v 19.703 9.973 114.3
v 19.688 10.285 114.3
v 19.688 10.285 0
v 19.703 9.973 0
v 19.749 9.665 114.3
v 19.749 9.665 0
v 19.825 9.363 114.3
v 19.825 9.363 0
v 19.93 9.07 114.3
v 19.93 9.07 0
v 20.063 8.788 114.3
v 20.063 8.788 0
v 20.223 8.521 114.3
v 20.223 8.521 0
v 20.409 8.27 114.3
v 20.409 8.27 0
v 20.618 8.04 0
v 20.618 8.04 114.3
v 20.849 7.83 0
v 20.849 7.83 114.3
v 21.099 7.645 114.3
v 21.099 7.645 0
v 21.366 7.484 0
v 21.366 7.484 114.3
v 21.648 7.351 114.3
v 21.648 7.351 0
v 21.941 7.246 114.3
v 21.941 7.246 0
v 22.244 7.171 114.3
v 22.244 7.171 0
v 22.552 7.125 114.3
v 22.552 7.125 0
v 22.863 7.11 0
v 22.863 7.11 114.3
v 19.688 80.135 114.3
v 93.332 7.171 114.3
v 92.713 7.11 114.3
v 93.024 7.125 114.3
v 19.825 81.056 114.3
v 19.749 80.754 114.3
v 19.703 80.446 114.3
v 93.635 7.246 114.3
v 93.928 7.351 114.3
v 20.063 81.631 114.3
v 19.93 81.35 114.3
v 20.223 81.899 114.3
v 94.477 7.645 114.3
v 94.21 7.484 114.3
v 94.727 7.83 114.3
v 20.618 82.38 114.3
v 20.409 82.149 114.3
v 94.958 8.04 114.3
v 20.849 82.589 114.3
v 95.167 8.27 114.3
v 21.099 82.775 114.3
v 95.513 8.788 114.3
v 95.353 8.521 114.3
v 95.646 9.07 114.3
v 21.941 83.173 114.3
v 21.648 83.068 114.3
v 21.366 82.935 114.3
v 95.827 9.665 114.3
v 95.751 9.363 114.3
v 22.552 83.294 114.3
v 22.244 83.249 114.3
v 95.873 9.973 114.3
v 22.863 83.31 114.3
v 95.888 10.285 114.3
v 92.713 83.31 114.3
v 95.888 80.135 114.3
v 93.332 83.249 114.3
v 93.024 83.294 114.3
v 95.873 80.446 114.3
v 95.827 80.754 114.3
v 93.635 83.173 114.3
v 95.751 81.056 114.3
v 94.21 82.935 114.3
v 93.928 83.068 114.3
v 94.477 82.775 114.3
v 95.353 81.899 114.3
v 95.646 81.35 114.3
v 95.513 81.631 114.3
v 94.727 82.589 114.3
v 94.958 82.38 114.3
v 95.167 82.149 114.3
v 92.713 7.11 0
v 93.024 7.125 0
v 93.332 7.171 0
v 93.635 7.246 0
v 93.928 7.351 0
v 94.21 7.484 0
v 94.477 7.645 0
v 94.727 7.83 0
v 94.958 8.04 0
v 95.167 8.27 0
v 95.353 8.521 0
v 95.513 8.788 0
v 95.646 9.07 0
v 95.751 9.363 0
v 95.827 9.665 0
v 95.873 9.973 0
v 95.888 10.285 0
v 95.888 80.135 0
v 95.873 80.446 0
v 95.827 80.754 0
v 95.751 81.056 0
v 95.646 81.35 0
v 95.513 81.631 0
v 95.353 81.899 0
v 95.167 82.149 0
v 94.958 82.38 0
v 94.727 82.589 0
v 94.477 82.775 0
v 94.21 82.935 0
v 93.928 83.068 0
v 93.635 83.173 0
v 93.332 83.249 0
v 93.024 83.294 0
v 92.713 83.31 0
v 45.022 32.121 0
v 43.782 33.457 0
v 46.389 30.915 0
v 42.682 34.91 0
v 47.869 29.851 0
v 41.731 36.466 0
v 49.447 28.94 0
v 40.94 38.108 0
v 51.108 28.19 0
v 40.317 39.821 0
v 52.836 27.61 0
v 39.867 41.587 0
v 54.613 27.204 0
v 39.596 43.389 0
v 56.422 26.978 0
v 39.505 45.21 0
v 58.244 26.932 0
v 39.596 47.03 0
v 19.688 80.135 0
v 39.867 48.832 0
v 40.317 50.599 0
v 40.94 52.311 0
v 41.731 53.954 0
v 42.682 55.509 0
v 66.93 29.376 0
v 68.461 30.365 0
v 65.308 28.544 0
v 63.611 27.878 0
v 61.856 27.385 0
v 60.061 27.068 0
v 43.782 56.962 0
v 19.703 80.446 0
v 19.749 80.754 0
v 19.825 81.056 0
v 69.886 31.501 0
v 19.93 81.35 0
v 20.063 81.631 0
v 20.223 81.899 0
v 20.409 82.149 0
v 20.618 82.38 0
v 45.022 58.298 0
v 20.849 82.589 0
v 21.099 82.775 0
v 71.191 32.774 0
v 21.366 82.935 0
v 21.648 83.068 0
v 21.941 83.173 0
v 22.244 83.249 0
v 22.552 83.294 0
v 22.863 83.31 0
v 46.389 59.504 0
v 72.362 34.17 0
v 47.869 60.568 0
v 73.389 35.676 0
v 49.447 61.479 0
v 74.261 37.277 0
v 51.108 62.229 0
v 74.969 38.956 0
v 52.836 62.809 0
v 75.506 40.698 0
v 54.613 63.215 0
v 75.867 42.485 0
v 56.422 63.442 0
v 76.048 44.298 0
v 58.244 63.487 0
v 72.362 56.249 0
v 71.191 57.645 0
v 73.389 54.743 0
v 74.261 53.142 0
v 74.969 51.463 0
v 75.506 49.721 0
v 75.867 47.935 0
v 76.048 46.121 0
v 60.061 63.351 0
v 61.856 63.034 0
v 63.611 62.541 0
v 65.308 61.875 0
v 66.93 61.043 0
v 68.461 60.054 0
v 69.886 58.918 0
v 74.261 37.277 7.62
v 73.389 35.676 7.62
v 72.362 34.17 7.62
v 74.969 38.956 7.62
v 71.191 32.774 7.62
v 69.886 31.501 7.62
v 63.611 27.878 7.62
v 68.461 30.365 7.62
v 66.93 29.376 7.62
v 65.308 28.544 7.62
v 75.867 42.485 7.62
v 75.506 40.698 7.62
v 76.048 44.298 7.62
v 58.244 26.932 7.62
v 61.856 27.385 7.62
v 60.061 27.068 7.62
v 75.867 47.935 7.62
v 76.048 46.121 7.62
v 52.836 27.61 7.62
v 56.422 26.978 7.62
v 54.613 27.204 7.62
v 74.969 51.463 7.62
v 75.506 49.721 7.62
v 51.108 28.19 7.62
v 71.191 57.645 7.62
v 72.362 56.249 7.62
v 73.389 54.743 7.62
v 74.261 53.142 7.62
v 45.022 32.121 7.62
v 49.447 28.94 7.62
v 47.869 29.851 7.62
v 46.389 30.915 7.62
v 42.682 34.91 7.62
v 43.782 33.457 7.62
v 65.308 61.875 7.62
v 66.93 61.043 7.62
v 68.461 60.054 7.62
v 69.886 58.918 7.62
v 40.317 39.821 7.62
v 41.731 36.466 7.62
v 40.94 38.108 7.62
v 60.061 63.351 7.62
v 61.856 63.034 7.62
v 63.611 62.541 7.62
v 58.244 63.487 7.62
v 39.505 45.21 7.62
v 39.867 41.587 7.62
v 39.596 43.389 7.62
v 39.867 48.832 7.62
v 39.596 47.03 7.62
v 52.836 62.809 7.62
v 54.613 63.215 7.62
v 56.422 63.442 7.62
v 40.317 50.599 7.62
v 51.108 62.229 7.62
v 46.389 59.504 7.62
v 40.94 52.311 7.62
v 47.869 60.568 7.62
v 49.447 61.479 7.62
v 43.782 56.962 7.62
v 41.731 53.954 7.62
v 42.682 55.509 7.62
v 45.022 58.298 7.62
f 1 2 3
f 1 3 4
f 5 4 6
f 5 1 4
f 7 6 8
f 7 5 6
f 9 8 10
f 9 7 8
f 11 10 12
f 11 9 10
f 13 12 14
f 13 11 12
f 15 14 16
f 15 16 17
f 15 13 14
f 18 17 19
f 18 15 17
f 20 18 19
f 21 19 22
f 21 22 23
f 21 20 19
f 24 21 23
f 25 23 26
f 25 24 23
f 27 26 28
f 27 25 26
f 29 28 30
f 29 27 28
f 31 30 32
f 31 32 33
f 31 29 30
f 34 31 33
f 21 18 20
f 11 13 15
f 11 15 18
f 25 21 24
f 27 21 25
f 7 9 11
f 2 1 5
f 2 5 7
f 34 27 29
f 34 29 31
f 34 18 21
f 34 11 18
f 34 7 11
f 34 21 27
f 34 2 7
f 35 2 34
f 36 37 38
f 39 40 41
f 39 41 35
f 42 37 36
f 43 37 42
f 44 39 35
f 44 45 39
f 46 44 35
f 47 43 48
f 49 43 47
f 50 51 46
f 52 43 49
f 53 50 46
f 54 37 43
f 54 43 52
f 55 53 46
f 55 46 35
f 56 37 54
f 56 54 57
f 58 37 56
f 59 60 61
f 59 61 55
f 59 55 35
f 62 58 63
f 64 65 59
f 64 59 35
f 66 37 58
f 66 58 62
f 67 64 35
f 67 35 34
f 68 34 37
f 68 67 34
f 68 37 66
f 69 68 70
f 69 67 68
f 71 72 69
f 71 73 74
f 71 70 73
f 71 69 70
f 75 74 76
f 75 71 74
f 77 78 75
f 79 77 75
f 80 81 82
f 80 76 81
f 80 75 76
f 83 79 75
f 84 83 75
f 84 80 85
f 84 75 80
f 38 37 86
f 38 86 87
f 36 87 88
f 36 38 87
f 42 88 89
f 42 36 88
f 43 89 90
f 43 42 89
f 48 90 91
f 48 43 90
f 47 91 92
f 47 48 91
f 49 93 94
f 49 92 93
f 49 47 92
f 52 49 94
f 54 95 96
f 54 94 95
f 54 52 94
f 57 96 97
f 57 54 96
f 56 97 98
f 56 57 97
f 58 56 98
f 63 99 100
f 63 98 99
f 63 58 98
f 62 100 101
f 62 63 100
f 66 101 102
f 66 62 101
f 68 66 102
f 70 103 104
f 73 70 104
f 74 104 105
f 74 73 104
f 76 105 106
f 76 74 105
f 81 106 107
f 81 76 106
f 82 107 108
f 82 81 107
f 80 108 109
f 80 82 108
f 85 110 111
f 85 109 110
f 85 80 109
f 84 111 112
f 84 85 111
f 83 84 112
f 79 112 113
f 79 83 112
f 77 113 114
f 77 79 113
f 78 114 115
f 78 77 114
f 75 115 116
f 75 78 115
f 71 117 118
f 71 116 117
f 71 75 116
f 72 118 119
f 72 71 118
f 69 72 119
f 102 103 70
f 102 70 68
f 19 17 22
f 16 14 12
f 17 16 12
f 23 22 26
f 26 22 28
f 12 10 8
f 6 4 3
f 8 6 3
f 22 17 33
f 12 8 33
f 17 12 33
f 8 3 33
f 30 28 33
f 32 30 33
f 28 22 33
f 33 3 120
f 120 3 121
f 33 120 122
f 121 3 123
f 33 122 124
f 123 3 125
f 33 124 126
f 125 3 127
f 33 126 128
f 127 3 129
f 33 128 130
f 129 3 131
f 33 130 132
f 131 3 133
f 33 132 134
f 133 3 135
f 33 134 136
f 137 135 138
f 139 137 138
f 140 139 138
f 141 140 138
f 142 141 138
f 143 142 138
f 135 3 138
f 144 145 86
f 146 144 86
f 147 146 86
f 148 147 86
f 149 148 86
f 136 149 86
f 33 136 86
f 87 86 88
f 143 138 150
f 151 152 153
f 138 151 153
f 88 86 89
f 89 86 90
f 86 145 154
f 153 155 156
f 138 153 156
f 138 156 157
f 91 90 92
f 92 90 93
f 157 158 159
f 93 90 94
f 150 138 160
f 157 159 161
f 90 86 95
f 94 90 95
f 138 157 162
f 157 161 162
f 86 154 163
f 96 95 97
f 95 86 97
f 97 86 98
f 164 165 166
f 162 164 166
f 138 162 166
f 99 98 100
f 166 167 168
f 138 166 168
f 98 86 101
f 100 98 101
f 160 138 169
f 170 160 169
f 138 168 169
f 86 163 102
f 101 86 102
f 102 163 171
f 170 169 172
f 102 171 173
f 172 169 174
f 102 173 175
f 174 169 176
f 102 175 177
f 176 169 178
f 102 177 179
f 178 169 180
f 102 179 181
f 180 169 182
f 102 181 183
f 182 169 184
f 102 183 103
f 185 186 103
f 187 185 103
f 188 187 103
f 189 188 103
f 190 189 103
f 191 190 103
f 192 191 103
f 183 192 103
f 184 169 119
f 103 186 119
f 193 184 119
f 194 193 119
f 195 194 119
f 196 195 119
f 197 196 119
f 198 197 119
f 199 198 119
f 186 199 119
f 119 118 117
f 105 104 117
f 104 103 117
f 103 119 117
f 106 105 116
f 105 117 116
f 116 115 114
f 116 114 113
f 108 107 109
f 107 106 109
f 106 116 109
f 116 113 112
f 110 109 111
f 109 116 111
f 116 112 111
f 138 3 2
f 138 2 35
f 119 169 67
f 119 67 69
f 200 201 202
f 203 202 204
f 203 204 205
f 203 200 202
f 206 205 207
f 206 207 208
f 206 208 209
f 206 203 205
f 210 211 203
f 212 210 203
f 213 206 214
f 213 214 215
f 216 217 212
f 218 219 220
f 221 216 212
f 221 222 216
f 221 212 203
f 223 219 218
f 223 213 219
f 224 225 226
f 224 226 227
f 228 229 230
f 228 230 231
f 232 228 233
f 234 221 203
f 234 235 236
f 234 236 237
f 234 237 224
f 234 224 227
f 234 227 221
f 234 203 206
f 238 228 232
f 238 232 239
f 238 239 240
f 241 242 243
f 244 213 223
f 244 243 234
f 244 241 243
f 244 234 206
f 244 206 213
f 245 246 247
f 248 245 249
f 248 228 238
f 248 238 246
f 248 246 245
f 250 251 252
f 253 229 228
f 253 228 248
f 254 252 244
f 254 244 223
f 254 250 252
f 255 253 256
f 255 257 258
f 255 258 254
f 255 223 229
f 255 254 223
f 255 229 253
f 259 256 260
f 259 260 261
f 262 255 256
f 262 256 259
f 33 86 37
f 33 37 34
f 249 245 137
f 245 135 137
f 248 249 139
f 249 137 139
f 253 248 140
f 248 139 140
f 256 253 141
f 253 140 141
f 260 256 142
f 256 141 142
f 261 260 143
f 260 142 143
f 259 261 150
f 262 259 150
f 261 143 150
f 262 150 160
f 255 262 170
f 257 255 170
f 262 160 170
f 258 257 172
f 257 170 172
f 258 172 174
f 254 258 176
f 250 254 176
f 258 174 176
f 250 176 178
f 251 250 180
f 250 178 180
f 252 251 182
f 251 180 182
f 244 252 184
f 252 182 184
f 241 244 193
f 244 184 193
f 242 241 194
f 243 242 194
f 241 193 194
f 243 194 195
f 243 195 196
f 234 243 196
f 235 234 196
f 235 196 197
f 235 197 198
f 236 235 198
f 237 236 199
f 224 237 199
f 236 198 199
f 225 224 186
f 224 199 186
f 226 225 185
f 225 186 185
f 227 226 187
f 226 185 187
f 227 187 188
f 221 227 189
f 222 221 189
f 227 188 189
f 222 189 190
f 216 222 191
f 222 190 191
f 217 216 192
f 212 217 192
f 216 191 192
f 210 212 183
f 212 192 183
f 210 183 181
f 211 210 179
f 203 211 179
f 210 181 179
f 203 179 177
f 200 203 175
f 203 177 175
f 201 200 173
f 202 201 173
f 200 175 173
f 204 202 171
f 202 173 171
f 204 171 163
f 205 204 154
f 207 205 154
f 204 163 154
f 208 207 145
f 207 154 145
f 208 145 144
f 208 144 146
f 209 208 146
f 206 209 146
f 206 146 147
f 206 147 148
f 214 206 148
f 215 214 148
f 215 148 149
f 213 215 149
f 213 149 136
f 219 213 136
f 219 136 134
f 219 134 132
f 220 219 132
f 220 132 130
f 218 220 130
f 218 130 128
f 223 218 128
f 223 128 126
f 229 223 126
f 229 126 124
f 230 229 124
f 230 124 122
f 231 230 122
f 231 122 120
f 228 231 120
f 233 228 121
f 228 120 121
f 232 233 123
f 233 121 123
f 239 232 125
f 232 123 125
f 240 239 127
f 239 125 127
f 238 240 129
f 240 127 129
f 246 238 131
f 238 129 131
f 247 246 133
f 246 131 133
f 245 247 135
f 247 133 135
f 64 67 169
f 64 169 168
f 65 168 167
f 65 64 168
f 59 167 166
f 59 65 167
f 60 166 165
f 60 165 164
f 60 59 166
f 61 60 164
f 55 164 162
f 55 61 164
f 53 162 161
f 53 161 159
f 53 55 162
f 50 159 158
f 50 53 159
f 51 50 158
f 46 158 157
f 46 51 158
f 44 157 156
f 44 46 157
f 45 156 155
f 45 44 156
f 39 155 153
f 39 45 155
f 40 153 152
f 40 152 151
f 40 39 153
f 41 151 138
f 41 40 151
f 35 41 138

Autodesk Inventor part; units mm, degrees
ref_plane "YZ Plane" through (0, 0, 0) normal (1, 0, 0) x (0, 1, 0)
ref_plane "XZ Plane" through (0, 0, 0) normal (0, 1, 0) x (-1, 0, 0)
ref_plane "XY Plane" through (0, 0, 0) normal (0, 0, 1) x (1, 0, 0)
sketch "Sketch1" plane through (0, 0, 0) normal (0, 0, 1) x (1, 0, 0)
  line L0 (19.688, 83.3096) -> (95.888, 83.3096)
  line L1 (95.888, 83.3096) -> (95.888, 7.1096)
  line L2 (95.888, 7.1096) -> (19.688, 7.1096)
  line L3 (19.688, 7.1096) -> (19.688, 83.3096)
  circle A0 centre (57.788, 45.2096) radius 23.0341
  point P0 (0, 0)
  dimension "d0" = 76.2
  dimension "d1" = 76.2
extrude "Extrusion1" add sketch "Sketch1" along normal blind 114.3 contours L0 L1 L2 L3 | A0
fillet "Fillet1" radius 3.175 4 edges at (19.688, 83.3096, 57.15) (95.888, 83.3096, 57.15) (95.888, 7.1096, 57.15) (19.688, 7.1096, 57.15)
sketch "Sketch2" plane through (95.888, 10.2846, 0) normal (1, 0, 0) x (0, 0, -1)
  line L0 (-83.9389, 49.2214) -> (-30.1471, 49.2214) construction
  line L1 (-30.1471, 49.2214) -> (-30.1471, 33.4582) construction
  line L2 (-30.1471, 33.4582) -> (-83.9389, 33.4582) construction
  line L3 (-83.9389, 33.4582) -> (-83.9389, 49.2214) construction
  point P0 (0, -10.2846)
sketch "Sketch3" plane through (0, 0, 0) normal (0, 0, -1) x (-1, 0, 0)
  circle A0 centre (-57.788, 45.2096) radius 18.2832
  line L0 (-92.713, 7.1096) -> (-22.863, 7.1096) projected
  line L1 (-95.888, 80.1346) -> (-95.888, 10.2846) projected
  point P0 (0, 0)
  dimension "d5" = 38.1
  dimension "d6" = 38.1
extrude "Extrusion2" cut sketch "Sketch3" against normal blind 7.62
properties part number "orca flash"
